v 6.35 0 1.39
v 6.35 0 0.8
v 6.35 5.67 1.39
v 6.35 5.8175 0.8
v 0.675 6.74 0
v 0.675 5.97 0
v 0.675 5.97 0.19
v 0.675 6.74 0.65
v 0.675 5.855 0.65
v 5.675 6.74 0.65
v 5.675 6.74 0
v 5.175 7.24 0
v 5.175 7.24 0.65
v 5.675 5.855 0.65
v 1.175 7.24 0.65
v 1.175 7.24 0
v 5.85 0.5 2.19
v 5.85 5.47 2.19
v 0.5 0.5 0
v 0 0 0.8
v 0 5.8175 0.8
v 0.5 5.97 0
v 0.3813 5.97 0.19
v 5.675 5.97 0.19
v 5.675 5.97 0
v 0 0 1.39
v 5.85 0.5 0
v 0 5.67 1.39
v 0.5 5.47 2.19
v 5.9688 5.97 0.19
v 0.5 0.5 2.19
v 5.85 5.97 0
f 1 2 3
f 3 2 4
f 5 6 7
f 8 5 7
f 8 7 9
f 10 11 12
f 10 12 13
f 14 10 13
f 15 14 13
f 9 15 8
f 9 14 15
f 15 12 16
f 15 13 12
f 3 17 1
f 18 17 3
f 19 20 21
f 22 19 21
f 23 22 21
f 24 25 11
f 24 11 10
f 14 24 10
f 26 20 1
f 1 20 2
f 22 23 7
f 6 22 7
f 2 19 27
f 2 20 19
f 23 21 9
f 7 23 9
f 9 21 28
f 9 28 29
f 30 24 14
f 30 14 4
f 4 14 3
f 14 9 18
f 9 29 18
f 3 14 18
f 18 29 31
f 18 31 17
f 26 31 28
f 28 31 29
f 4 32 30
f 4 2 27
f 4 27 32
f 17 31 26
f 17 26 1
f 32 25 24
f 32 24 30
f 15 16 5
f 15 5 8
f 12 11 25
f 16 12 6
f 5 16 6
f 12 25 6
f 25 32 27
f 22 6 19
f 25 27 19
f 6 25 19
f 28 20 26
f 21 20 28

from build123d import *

# Parameters (mm, degrees)
ESQUISSE1_W             = 6.35
ESQUISSE1_H             = 5.97
BOSS_EXTRU_1_DEPTH      = 2.19
CHANFREIN1_SIZE         = 0.8
CHANFREIN1_SIZE2        = 0.5
CHANFREIN2_SIZE         = 0.5
CHANFREIN2_SIZE2        = 0.8
CHANFREIN3_SIZE         = 0.8
CHANFREIN3_SIZE2        = 0.5
CHANFREIN4_SIZE         = 0.5
CHANFREIN4_SIZE2        = 0.8
CHANFREIN5_SIZE         = 0.8
CHANFREIN5_SIZE2        = 0.5
CHANFREIN6_SIZE         = 0.5
CHANFREIN6_SIZE2        = 0.8
CHANFREIN7_SIZE         = 2
CHANFREIN7_SIZE2        = 0.5
ESQUISSE2_W             = 5
ESQUISSE2_H             = 0.65
BOSS_EXTRU_2_DEPTH      = 1.27
BOSS_EXTRU_2_DEPTH_BACK = 5
CHANFREIN8_SIZE         = 0.5


with BuildPart() as part:
    # Esquisse1 → Boss.-Extru.1 (new body)
    with BuildSketch(Plane.XY):
        with Locations((3.175, 2.985)):
            Rectangle(ESQUISSE1_W, ESQUISSE1_H)
    extrude(amount=BOSS_EXTRU_1_DEPTH)

    # Chanfrein1
    chanfrein1_edges = [part.edges().sort_by_distance(p)[0] for p in [
        (6.35, 2.985, 2.19),
    ]]
    chanfrein1_side = [part.faces().sort_by_distance(p)[0] for p in [
        (6.35, 2.985, 1.095),
    ]]
    chamfer(chanfrein1_edges, length=CHANFREIN1_SIZE, length2=CHANFREIN1_SIZE2, reference=chanfrein1_side[0])

    # Chanfrein2
    chanfrein2_edges = [part.edges().sort_by_distance(p)[0] for p in [
        (6.35, 2.985, 0),
    ]]
    chanfrein2_side = [part.faces().sort_by_distance(p)[0] for p in [
        (3.175, 2.985, 0),
    ]]
    chamfer(chanfrein2_edges, length=CHANFREIN2_SIZE, length2=CHANFREIN2_SIZE2, reference=chanfrein2_side[0])

    # Chanfrein3
    chanfrein3_edges = [part.edges().sort_by_distance(p)[0] for p in [
        (2.925, 0, 2.19),
    ]]
    chanfrein3_side = [part.faces().sort_by_distance(p)[0] for p in [
        (3.085907094, 0, 1.095),
    ]]
    chamfer(chanfrein3_edges, length=CHANFREIN3_SIZE, length2=CHANFREIN3_SIZE2, reference=chanfrein3_side[0])

    # Chanfrein4
    chanfrein4_edges = [part.edges().sort_by_distance(p)[0] for p in [
        (2.925, 0, 0),
    ]]
    chanfrein4_side = [part.faces().sort_by_distance(p)[0] for p in [
        (2.925, 2.985, 0),
    ]]
    chamfer(chanfrein4_edges, length=CHANFREIN4_SIZE, length2=CHANFREIN4_SIZE2, reference=chanfrein4_side[0])

    # Chanfrein5
    chanfrein5_edges = [part.edges().sort_by_distance(p)[0] for p in [
        (0, 3.235, 2.19),
    ]]
    chanfrein5_side = [part.faces().sort_by_distance(p)[0] for p in [
        (0, 3.073946398, 1.095),
    ]]
    chamfer(chanfrein5_edges, length=CHANFREIN5_SIZE, length2=CHANFREIN5_SIZE2, reference=chanfrein5_side[0])

    # Chanfrein6
    chanfrein6_edges = [part.edges().sort_by_distance(p)[0] for p in [
        (0, 3.235, 0),
    ]]
    chanfrein6_side = [part.faces().sort_by_distance(p)[0] for p in [
        (2.925, 3.235, 0),
    ]]
    chamfer(chanfrein6_edges, length=CHANFREIN6_SIZE, length2=CHANFREIN6_SIZE2, reference=chanfrein6_side[0])

    # Chanfrein7
    chanfrein7_edges = [part.edges().sort_by_distance(p)[0] for p in [
        (3.175, 5.97, 2.19),
    ]]
    chanfrein7_side = [part.faces().sort_by_distance(p)[0] for p in [
        (3.175, 5.97, 1.095),
    ]]
    chamfer(chanfrein7_edges, length=CHANFREIN7_SIZE, length2=CHANFREIN7_SIZE2, reference=chanfrein7_side[0])

    # Esquisse2 → Boss.-Extru.2 (add, two sides)
    with BuildSketch(Plane(origin=(0, 5.97, 0), x_dir=(-1, 0, 0), z_dir=(0, 1, 0))) as boss_extru_2_sk:
        with Locations((-3.175, 0.325)):
            Rectangle(ESQUISSE2_W, ESQUISSE2_H)
    extrude(amount=BOSS_EXTRU_2_DEPTH)
    extrude(boss_extru_2_sk.sketch, amount=-BOSS_EXTRU_2_DEPTH_BACK)

    # Chanfrein8
    chanfrein8_edges = [part.edges().sort_by_distance(p)[0] for p in [
        (0.675, 7.24, 0.325),
        (5.675, 7.24, 0.325),
    ]]
    chamfer(chanfrein8_edges, length=CHANFREIN8_SIZE)


solid = part.part
